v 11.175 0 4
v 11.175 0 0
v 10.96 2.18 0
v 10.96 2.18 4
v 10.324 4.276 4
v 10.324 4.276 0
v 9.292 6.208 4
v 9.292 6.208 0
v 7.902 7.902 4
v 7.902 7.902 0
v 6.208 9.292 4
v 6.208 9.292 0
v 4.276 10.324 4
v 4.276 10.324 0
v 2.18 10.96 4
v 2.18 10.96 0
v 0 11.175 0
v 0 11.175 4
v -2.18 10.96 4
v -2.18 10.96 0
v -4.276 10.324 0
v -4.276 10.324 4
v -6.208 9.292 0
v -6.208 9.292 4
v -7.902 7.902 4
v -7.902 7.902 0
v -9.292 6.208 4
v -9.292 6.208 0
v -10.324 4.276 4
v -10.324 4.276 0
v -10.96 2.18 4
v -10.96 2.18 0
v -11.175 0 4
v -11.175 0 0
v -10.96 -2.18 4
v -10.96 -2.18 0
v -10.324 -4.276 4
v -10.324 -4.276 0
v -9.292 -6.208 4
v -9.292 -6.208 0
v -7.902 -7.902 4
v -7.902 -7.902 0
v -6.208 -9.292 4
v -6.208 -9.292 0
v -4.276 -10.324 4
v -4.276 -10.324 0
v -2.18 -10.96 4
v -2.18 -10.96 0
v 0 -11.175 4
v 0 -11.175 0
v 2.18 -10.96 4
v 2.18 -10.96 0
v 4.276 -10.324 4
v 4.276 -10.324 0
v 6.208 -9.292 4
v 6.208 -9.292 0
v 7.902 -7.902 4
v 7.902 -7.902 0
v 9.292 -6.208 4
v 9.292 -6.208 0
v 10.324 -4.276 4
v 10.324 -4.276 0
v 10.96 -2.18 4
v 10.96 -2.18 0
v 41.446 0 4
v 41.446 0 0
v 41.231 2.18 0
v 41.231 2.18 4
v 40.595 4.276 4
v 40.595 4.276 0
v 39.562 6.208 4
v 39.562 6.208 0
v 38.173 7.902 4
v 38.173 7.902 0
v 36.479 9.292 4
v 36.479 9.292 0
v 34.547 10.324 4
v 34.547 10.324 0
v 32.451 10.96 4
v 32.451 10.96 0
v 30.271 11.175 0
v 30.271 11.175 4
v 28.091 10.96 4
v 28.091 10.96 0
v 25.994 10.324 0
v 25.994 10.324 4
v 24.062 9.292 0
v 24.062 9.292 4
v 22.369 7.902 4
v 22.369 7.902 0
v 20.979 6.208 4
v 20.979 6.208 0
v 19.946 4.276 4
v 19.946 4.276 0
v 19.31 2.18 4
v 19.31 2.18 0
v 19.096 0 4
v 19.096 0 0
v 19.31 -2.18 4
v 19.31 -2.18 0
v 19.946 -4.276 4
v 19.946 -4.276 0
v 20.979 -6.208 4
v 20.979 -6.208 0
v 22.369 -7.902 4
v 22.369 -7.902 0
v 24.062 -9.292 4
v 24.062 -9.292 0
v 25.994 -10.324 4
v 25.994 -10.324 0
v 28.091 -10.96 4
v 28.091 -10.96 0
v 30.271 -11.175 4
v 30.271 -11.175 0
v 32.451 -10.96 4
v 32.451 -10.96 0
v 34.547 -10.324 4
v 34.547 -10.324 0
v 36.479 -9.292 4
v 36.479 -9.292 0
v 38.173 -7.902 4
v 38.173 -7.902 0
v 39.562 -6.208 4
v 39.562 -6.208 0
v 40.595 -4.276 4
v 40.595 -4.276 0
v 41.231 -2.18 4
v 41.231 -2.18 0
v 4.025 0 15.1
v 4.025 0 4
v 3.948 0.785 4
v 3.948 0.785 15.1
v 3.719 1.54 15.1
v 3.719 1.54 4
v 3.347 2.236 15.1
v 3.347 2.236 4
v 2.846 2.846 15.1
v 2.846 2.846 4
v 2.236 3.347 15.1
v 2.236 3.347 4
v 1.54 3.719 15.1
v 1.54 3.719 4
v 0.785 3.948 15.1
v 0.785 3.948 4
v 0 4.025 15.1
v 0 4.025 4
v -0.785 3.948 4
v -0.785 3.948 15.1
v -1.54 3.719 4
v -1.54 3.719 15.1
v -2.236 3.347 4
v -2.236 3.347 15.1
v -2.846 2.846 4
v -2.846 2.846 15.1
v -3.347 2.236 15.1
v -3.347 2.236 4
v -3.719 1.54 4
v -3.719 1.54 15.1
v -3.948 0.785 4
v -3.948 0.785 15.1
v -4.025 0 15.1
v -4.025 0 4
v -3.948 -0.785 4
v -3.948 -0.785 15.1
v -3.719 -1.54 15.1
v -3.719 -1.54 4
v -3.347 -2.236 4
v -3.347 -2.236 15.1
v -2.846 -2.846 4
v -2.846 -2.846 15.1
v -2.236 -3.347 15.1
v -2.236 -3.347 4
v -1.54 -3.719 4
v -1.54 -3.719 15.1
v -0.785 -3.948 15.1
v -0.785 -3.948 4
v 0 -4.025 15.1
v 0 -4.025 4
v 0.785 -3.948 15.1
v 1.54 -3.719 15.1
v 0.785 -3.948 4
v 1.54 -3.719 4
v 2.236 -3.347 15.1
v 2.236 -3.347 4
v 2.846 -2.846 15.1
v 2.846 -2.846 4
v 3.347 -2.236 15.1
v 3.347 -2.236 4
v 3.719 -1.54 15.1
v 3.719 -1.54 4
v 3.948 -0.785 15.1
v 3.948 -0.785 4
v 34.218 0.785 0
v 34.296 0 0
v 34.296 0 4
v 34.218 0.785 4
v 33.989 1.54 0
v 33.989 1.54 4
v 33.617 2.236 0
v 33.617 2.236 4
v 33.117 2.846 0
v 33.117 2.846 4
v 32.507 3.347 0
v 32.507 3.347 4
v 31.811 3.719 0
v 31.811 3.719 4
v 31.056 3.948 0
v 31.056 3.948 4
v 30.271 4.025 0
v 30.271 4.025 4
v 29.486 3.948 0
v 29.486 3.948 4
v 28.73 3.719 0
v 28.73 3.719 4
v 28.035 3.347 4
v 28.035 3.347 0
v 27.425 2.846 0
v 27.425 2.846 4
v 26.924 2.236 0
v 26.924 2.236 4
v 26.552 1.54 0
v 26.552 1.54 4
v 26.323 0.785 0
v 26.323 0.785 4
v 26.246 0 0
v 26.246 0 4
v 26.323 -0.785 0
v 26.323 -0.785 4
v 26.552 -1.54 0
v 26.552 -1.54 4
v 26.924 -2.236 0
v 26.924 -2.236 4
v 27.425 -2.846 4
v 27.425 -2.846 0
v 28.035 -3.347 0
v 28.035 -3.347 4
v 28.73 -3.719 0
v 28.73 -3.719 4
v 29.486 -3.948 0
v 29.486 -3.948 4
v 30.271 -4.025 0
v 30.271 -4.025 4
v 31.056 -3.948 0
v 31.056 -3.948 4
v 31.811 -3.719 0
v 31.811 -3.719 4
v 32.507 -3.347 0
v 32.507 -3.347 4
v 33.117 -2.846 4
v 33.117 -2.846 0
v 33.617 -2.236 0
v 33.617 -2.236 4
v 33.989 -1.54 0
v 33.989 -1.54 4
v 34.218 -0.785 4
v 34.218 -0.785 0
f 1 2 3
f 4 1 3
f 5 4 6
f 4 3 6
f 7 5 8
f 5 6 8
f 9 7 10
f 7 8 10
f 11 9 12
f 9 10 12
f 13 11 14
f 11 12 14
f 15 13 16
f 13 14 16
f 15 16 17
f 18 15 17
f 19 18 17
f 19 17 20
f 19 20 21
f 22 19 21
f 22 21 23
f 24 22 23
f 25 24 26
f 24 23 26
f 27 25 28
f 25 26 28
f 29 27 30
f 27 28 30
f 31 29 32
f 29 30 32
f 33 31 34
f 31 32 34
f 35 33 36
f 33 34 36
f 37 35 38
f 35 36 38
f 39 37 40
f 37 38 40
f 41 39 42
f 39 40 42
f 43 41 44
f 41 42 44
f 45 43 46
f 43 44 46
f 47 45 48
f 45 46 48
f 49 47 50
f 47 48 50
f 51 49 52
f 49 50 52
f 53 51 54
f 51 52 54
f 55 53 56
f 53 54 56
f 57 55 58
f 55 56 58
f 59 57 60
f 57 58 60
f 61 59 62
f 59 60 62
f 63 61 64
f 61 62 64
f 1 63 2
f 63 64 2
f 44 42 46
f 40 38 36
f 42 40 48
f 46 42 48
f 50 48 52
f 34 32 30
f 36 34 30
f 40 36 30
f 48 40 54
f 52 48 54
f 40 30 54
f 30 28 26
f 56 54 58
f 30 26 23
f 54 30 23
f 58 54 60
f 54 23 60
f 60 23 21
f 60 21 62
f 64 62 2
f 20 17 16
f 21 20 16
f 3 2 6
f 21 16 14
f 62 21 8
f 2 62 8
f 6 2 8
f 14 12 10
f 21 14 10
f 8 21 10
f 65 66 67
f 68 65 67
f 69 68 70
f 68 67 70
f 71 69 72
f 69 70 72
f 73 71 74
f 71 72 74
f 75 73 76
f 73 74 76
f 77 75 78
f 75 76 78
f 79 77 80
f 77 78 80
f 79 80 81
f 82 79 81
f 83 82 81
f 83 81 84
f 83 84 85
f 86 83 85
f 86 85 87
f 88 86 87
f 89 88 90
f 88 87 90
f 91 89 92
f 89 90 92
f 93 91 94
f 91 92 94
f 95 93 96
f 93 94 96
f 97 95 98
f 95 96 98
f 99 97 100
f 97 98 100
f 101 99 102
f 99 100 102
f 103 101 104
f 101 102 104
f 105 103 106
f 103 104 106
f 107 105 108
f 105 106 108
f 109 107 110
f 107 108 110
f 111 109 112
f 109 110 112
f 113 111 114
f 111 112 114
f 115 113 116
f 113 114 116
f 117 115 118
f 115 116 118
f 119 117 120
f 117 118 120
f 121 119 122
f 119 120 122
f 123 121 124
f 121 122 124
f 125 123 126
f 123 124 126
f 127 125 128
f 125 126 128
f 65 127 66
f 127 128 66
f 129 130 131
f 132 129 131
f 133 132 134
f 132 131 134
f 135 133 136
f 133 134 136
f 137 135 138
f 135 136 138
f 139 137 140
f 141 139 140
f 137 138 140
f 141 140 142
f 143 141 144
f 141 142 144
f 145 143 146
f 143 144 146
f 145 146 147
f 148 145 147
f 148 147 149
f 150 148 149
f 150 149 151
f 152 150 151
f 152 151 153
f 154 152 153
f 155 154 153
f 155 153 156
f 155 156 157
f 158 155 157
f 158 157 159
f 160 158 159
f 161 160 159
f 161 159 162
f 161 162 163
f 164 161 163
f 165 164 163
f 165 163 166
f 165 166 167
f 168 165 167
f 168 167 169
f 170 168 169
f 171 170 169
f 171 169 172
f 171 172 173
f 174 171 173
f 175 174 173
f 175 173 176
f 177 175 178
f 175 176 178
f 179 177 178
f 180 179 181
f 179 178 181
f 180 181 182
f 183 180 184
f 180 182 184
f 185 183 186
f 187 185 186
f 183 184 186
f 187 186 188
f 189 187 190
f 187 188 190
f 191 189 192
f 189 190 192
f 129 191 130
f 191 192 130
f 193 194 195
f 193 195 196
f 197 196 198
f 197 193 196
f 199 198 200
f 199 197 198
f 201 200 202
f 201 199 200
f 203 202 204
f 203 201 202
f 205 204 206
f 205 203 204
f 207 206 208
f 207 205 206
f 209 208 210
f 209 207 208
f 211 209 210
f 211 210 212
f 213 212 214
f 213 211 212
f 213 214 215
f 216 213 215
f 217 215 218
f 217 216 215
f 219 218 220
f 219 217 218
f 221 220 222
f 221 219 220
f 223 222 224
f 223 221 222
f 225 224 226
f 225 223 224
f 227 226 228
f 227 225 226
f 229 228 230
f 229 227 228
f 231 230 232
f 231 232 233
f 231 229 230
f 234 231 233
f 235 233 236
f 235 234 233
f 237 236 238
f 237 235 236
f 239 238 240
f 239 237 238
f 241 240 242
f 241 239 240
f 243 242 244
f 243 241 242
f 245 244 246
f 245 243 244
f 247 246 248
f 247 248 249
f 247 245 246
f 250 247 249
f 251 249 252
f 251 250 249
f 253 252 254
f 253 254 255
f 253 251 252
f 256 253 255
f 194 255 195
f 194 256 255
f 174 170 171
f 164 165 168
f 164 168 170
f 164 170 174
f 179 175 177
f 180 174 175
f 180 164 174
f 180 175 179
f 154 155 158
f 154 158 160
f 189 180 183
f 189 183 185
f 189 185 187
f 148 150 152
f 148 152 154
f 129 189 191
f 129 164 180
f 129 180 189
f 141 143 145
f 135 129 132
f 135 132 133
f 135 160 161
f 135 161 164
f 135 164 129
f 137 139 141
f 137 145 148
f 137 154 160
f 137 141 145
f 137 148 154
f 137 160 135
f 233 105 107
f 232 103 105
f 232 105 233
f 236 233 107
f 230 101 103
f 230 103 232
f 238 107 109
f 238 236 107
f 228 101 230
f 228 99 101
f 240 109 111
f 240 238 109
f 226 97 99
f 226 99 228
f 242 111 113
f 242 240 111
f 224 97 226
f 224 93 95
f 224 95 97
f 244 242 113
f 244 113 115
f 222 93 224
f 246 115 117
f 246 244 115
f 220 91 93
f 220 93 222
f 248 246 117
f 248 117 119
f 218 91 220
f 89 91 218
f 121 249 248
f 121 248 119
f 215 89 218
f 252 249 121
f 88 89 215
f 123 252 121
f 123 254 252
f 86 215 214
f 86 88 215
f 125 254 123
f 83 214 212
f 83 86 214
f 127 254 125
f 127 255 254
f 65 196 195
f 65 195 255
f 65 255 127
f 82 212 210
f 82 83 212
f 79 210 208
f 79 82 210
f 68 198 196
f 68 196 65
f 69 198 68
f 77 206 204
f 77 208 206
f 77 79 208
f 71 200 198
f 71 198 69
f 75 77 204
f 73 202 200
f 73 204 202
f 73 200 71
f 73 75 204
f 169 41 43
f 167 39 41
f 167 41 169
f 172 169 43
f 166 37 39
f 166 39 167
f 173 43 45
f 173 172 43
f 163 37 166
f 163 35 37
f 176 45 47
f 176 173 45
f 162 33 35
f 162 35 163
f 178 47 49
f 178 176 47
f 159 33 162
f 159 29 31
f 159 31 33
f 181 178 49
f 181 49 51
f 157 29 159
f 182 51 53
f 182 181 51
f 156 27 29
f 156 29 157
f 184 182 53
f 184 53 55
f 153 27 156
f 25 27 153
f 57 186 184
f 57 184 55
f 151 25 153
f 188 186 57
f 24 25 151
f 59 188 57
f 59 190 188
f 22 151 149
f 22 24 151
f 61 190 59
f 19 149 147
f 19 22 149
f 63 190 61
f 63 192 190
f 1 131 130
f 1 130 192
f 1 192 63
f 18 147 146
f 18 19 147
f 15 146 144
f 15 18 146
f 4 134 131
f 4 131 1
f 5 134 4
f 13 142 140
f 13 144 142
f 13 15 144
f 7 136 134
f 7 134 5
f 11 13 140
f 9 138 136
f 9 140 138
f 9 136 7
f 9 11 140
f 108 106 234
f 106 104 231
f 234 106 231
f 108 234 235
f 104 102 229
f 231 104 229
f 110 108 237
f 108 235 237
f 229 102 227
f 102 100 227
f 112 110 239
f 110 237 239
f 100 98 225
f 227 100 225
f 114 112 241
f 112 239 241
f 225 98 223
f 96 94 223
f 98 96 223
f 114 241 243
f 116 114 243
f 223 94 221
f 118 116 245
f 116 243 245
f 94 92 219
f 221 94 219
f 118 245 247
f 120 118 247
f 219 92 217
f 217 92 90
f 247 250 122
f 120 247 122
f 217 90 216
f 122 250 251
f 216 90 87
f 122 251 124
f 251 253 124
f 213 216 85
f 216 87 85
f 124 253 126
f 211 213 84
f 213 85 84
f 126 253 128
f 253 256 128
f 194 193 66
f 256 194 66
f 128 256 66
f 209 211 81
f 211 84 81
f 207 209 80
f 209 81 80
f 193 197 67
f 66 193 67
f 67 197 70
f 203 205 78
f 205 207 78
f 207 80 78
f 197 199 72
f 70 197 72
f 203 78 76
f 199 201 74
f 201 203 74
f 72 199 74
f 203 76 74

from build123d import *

# Parameters (mm, degrees)
F0_R     = 11.175
F0_R_2   = 4.025
F1_DEPTH = 4
F2_DEPTH = 4
F3_DEPTH = 15.1


with BuildPart() as f1:
    # F0 (on Top) → F1 (new body)
    with BuildSketch(Plane.XY):
        Circle(F0_R)
        Circle(F0_R_2, mode=Mode.SUBTRACT)
    extrude(amount=F1_DEPTH)

    # F0 (on Top) → F3 (join)
    with BuildSketch(Plane.XY):
        Circle(F0_R_2)
    extrude(amount=F3_DEPTH)


with BuildPart() as f2:
    # F0 (on Top) → F2 (new body)
    with BuildSketch(Plane.XY):
        with Locations((30.270739, 0)):
            Circle(F0_R)
        with Locations((30.270739, 0)):
            Circle(F0_R_2, mode=Mode.SUBTRACT)
    extrude(amount=F2_DEPTH)


solid = Compound([f1.part, f2.part])
